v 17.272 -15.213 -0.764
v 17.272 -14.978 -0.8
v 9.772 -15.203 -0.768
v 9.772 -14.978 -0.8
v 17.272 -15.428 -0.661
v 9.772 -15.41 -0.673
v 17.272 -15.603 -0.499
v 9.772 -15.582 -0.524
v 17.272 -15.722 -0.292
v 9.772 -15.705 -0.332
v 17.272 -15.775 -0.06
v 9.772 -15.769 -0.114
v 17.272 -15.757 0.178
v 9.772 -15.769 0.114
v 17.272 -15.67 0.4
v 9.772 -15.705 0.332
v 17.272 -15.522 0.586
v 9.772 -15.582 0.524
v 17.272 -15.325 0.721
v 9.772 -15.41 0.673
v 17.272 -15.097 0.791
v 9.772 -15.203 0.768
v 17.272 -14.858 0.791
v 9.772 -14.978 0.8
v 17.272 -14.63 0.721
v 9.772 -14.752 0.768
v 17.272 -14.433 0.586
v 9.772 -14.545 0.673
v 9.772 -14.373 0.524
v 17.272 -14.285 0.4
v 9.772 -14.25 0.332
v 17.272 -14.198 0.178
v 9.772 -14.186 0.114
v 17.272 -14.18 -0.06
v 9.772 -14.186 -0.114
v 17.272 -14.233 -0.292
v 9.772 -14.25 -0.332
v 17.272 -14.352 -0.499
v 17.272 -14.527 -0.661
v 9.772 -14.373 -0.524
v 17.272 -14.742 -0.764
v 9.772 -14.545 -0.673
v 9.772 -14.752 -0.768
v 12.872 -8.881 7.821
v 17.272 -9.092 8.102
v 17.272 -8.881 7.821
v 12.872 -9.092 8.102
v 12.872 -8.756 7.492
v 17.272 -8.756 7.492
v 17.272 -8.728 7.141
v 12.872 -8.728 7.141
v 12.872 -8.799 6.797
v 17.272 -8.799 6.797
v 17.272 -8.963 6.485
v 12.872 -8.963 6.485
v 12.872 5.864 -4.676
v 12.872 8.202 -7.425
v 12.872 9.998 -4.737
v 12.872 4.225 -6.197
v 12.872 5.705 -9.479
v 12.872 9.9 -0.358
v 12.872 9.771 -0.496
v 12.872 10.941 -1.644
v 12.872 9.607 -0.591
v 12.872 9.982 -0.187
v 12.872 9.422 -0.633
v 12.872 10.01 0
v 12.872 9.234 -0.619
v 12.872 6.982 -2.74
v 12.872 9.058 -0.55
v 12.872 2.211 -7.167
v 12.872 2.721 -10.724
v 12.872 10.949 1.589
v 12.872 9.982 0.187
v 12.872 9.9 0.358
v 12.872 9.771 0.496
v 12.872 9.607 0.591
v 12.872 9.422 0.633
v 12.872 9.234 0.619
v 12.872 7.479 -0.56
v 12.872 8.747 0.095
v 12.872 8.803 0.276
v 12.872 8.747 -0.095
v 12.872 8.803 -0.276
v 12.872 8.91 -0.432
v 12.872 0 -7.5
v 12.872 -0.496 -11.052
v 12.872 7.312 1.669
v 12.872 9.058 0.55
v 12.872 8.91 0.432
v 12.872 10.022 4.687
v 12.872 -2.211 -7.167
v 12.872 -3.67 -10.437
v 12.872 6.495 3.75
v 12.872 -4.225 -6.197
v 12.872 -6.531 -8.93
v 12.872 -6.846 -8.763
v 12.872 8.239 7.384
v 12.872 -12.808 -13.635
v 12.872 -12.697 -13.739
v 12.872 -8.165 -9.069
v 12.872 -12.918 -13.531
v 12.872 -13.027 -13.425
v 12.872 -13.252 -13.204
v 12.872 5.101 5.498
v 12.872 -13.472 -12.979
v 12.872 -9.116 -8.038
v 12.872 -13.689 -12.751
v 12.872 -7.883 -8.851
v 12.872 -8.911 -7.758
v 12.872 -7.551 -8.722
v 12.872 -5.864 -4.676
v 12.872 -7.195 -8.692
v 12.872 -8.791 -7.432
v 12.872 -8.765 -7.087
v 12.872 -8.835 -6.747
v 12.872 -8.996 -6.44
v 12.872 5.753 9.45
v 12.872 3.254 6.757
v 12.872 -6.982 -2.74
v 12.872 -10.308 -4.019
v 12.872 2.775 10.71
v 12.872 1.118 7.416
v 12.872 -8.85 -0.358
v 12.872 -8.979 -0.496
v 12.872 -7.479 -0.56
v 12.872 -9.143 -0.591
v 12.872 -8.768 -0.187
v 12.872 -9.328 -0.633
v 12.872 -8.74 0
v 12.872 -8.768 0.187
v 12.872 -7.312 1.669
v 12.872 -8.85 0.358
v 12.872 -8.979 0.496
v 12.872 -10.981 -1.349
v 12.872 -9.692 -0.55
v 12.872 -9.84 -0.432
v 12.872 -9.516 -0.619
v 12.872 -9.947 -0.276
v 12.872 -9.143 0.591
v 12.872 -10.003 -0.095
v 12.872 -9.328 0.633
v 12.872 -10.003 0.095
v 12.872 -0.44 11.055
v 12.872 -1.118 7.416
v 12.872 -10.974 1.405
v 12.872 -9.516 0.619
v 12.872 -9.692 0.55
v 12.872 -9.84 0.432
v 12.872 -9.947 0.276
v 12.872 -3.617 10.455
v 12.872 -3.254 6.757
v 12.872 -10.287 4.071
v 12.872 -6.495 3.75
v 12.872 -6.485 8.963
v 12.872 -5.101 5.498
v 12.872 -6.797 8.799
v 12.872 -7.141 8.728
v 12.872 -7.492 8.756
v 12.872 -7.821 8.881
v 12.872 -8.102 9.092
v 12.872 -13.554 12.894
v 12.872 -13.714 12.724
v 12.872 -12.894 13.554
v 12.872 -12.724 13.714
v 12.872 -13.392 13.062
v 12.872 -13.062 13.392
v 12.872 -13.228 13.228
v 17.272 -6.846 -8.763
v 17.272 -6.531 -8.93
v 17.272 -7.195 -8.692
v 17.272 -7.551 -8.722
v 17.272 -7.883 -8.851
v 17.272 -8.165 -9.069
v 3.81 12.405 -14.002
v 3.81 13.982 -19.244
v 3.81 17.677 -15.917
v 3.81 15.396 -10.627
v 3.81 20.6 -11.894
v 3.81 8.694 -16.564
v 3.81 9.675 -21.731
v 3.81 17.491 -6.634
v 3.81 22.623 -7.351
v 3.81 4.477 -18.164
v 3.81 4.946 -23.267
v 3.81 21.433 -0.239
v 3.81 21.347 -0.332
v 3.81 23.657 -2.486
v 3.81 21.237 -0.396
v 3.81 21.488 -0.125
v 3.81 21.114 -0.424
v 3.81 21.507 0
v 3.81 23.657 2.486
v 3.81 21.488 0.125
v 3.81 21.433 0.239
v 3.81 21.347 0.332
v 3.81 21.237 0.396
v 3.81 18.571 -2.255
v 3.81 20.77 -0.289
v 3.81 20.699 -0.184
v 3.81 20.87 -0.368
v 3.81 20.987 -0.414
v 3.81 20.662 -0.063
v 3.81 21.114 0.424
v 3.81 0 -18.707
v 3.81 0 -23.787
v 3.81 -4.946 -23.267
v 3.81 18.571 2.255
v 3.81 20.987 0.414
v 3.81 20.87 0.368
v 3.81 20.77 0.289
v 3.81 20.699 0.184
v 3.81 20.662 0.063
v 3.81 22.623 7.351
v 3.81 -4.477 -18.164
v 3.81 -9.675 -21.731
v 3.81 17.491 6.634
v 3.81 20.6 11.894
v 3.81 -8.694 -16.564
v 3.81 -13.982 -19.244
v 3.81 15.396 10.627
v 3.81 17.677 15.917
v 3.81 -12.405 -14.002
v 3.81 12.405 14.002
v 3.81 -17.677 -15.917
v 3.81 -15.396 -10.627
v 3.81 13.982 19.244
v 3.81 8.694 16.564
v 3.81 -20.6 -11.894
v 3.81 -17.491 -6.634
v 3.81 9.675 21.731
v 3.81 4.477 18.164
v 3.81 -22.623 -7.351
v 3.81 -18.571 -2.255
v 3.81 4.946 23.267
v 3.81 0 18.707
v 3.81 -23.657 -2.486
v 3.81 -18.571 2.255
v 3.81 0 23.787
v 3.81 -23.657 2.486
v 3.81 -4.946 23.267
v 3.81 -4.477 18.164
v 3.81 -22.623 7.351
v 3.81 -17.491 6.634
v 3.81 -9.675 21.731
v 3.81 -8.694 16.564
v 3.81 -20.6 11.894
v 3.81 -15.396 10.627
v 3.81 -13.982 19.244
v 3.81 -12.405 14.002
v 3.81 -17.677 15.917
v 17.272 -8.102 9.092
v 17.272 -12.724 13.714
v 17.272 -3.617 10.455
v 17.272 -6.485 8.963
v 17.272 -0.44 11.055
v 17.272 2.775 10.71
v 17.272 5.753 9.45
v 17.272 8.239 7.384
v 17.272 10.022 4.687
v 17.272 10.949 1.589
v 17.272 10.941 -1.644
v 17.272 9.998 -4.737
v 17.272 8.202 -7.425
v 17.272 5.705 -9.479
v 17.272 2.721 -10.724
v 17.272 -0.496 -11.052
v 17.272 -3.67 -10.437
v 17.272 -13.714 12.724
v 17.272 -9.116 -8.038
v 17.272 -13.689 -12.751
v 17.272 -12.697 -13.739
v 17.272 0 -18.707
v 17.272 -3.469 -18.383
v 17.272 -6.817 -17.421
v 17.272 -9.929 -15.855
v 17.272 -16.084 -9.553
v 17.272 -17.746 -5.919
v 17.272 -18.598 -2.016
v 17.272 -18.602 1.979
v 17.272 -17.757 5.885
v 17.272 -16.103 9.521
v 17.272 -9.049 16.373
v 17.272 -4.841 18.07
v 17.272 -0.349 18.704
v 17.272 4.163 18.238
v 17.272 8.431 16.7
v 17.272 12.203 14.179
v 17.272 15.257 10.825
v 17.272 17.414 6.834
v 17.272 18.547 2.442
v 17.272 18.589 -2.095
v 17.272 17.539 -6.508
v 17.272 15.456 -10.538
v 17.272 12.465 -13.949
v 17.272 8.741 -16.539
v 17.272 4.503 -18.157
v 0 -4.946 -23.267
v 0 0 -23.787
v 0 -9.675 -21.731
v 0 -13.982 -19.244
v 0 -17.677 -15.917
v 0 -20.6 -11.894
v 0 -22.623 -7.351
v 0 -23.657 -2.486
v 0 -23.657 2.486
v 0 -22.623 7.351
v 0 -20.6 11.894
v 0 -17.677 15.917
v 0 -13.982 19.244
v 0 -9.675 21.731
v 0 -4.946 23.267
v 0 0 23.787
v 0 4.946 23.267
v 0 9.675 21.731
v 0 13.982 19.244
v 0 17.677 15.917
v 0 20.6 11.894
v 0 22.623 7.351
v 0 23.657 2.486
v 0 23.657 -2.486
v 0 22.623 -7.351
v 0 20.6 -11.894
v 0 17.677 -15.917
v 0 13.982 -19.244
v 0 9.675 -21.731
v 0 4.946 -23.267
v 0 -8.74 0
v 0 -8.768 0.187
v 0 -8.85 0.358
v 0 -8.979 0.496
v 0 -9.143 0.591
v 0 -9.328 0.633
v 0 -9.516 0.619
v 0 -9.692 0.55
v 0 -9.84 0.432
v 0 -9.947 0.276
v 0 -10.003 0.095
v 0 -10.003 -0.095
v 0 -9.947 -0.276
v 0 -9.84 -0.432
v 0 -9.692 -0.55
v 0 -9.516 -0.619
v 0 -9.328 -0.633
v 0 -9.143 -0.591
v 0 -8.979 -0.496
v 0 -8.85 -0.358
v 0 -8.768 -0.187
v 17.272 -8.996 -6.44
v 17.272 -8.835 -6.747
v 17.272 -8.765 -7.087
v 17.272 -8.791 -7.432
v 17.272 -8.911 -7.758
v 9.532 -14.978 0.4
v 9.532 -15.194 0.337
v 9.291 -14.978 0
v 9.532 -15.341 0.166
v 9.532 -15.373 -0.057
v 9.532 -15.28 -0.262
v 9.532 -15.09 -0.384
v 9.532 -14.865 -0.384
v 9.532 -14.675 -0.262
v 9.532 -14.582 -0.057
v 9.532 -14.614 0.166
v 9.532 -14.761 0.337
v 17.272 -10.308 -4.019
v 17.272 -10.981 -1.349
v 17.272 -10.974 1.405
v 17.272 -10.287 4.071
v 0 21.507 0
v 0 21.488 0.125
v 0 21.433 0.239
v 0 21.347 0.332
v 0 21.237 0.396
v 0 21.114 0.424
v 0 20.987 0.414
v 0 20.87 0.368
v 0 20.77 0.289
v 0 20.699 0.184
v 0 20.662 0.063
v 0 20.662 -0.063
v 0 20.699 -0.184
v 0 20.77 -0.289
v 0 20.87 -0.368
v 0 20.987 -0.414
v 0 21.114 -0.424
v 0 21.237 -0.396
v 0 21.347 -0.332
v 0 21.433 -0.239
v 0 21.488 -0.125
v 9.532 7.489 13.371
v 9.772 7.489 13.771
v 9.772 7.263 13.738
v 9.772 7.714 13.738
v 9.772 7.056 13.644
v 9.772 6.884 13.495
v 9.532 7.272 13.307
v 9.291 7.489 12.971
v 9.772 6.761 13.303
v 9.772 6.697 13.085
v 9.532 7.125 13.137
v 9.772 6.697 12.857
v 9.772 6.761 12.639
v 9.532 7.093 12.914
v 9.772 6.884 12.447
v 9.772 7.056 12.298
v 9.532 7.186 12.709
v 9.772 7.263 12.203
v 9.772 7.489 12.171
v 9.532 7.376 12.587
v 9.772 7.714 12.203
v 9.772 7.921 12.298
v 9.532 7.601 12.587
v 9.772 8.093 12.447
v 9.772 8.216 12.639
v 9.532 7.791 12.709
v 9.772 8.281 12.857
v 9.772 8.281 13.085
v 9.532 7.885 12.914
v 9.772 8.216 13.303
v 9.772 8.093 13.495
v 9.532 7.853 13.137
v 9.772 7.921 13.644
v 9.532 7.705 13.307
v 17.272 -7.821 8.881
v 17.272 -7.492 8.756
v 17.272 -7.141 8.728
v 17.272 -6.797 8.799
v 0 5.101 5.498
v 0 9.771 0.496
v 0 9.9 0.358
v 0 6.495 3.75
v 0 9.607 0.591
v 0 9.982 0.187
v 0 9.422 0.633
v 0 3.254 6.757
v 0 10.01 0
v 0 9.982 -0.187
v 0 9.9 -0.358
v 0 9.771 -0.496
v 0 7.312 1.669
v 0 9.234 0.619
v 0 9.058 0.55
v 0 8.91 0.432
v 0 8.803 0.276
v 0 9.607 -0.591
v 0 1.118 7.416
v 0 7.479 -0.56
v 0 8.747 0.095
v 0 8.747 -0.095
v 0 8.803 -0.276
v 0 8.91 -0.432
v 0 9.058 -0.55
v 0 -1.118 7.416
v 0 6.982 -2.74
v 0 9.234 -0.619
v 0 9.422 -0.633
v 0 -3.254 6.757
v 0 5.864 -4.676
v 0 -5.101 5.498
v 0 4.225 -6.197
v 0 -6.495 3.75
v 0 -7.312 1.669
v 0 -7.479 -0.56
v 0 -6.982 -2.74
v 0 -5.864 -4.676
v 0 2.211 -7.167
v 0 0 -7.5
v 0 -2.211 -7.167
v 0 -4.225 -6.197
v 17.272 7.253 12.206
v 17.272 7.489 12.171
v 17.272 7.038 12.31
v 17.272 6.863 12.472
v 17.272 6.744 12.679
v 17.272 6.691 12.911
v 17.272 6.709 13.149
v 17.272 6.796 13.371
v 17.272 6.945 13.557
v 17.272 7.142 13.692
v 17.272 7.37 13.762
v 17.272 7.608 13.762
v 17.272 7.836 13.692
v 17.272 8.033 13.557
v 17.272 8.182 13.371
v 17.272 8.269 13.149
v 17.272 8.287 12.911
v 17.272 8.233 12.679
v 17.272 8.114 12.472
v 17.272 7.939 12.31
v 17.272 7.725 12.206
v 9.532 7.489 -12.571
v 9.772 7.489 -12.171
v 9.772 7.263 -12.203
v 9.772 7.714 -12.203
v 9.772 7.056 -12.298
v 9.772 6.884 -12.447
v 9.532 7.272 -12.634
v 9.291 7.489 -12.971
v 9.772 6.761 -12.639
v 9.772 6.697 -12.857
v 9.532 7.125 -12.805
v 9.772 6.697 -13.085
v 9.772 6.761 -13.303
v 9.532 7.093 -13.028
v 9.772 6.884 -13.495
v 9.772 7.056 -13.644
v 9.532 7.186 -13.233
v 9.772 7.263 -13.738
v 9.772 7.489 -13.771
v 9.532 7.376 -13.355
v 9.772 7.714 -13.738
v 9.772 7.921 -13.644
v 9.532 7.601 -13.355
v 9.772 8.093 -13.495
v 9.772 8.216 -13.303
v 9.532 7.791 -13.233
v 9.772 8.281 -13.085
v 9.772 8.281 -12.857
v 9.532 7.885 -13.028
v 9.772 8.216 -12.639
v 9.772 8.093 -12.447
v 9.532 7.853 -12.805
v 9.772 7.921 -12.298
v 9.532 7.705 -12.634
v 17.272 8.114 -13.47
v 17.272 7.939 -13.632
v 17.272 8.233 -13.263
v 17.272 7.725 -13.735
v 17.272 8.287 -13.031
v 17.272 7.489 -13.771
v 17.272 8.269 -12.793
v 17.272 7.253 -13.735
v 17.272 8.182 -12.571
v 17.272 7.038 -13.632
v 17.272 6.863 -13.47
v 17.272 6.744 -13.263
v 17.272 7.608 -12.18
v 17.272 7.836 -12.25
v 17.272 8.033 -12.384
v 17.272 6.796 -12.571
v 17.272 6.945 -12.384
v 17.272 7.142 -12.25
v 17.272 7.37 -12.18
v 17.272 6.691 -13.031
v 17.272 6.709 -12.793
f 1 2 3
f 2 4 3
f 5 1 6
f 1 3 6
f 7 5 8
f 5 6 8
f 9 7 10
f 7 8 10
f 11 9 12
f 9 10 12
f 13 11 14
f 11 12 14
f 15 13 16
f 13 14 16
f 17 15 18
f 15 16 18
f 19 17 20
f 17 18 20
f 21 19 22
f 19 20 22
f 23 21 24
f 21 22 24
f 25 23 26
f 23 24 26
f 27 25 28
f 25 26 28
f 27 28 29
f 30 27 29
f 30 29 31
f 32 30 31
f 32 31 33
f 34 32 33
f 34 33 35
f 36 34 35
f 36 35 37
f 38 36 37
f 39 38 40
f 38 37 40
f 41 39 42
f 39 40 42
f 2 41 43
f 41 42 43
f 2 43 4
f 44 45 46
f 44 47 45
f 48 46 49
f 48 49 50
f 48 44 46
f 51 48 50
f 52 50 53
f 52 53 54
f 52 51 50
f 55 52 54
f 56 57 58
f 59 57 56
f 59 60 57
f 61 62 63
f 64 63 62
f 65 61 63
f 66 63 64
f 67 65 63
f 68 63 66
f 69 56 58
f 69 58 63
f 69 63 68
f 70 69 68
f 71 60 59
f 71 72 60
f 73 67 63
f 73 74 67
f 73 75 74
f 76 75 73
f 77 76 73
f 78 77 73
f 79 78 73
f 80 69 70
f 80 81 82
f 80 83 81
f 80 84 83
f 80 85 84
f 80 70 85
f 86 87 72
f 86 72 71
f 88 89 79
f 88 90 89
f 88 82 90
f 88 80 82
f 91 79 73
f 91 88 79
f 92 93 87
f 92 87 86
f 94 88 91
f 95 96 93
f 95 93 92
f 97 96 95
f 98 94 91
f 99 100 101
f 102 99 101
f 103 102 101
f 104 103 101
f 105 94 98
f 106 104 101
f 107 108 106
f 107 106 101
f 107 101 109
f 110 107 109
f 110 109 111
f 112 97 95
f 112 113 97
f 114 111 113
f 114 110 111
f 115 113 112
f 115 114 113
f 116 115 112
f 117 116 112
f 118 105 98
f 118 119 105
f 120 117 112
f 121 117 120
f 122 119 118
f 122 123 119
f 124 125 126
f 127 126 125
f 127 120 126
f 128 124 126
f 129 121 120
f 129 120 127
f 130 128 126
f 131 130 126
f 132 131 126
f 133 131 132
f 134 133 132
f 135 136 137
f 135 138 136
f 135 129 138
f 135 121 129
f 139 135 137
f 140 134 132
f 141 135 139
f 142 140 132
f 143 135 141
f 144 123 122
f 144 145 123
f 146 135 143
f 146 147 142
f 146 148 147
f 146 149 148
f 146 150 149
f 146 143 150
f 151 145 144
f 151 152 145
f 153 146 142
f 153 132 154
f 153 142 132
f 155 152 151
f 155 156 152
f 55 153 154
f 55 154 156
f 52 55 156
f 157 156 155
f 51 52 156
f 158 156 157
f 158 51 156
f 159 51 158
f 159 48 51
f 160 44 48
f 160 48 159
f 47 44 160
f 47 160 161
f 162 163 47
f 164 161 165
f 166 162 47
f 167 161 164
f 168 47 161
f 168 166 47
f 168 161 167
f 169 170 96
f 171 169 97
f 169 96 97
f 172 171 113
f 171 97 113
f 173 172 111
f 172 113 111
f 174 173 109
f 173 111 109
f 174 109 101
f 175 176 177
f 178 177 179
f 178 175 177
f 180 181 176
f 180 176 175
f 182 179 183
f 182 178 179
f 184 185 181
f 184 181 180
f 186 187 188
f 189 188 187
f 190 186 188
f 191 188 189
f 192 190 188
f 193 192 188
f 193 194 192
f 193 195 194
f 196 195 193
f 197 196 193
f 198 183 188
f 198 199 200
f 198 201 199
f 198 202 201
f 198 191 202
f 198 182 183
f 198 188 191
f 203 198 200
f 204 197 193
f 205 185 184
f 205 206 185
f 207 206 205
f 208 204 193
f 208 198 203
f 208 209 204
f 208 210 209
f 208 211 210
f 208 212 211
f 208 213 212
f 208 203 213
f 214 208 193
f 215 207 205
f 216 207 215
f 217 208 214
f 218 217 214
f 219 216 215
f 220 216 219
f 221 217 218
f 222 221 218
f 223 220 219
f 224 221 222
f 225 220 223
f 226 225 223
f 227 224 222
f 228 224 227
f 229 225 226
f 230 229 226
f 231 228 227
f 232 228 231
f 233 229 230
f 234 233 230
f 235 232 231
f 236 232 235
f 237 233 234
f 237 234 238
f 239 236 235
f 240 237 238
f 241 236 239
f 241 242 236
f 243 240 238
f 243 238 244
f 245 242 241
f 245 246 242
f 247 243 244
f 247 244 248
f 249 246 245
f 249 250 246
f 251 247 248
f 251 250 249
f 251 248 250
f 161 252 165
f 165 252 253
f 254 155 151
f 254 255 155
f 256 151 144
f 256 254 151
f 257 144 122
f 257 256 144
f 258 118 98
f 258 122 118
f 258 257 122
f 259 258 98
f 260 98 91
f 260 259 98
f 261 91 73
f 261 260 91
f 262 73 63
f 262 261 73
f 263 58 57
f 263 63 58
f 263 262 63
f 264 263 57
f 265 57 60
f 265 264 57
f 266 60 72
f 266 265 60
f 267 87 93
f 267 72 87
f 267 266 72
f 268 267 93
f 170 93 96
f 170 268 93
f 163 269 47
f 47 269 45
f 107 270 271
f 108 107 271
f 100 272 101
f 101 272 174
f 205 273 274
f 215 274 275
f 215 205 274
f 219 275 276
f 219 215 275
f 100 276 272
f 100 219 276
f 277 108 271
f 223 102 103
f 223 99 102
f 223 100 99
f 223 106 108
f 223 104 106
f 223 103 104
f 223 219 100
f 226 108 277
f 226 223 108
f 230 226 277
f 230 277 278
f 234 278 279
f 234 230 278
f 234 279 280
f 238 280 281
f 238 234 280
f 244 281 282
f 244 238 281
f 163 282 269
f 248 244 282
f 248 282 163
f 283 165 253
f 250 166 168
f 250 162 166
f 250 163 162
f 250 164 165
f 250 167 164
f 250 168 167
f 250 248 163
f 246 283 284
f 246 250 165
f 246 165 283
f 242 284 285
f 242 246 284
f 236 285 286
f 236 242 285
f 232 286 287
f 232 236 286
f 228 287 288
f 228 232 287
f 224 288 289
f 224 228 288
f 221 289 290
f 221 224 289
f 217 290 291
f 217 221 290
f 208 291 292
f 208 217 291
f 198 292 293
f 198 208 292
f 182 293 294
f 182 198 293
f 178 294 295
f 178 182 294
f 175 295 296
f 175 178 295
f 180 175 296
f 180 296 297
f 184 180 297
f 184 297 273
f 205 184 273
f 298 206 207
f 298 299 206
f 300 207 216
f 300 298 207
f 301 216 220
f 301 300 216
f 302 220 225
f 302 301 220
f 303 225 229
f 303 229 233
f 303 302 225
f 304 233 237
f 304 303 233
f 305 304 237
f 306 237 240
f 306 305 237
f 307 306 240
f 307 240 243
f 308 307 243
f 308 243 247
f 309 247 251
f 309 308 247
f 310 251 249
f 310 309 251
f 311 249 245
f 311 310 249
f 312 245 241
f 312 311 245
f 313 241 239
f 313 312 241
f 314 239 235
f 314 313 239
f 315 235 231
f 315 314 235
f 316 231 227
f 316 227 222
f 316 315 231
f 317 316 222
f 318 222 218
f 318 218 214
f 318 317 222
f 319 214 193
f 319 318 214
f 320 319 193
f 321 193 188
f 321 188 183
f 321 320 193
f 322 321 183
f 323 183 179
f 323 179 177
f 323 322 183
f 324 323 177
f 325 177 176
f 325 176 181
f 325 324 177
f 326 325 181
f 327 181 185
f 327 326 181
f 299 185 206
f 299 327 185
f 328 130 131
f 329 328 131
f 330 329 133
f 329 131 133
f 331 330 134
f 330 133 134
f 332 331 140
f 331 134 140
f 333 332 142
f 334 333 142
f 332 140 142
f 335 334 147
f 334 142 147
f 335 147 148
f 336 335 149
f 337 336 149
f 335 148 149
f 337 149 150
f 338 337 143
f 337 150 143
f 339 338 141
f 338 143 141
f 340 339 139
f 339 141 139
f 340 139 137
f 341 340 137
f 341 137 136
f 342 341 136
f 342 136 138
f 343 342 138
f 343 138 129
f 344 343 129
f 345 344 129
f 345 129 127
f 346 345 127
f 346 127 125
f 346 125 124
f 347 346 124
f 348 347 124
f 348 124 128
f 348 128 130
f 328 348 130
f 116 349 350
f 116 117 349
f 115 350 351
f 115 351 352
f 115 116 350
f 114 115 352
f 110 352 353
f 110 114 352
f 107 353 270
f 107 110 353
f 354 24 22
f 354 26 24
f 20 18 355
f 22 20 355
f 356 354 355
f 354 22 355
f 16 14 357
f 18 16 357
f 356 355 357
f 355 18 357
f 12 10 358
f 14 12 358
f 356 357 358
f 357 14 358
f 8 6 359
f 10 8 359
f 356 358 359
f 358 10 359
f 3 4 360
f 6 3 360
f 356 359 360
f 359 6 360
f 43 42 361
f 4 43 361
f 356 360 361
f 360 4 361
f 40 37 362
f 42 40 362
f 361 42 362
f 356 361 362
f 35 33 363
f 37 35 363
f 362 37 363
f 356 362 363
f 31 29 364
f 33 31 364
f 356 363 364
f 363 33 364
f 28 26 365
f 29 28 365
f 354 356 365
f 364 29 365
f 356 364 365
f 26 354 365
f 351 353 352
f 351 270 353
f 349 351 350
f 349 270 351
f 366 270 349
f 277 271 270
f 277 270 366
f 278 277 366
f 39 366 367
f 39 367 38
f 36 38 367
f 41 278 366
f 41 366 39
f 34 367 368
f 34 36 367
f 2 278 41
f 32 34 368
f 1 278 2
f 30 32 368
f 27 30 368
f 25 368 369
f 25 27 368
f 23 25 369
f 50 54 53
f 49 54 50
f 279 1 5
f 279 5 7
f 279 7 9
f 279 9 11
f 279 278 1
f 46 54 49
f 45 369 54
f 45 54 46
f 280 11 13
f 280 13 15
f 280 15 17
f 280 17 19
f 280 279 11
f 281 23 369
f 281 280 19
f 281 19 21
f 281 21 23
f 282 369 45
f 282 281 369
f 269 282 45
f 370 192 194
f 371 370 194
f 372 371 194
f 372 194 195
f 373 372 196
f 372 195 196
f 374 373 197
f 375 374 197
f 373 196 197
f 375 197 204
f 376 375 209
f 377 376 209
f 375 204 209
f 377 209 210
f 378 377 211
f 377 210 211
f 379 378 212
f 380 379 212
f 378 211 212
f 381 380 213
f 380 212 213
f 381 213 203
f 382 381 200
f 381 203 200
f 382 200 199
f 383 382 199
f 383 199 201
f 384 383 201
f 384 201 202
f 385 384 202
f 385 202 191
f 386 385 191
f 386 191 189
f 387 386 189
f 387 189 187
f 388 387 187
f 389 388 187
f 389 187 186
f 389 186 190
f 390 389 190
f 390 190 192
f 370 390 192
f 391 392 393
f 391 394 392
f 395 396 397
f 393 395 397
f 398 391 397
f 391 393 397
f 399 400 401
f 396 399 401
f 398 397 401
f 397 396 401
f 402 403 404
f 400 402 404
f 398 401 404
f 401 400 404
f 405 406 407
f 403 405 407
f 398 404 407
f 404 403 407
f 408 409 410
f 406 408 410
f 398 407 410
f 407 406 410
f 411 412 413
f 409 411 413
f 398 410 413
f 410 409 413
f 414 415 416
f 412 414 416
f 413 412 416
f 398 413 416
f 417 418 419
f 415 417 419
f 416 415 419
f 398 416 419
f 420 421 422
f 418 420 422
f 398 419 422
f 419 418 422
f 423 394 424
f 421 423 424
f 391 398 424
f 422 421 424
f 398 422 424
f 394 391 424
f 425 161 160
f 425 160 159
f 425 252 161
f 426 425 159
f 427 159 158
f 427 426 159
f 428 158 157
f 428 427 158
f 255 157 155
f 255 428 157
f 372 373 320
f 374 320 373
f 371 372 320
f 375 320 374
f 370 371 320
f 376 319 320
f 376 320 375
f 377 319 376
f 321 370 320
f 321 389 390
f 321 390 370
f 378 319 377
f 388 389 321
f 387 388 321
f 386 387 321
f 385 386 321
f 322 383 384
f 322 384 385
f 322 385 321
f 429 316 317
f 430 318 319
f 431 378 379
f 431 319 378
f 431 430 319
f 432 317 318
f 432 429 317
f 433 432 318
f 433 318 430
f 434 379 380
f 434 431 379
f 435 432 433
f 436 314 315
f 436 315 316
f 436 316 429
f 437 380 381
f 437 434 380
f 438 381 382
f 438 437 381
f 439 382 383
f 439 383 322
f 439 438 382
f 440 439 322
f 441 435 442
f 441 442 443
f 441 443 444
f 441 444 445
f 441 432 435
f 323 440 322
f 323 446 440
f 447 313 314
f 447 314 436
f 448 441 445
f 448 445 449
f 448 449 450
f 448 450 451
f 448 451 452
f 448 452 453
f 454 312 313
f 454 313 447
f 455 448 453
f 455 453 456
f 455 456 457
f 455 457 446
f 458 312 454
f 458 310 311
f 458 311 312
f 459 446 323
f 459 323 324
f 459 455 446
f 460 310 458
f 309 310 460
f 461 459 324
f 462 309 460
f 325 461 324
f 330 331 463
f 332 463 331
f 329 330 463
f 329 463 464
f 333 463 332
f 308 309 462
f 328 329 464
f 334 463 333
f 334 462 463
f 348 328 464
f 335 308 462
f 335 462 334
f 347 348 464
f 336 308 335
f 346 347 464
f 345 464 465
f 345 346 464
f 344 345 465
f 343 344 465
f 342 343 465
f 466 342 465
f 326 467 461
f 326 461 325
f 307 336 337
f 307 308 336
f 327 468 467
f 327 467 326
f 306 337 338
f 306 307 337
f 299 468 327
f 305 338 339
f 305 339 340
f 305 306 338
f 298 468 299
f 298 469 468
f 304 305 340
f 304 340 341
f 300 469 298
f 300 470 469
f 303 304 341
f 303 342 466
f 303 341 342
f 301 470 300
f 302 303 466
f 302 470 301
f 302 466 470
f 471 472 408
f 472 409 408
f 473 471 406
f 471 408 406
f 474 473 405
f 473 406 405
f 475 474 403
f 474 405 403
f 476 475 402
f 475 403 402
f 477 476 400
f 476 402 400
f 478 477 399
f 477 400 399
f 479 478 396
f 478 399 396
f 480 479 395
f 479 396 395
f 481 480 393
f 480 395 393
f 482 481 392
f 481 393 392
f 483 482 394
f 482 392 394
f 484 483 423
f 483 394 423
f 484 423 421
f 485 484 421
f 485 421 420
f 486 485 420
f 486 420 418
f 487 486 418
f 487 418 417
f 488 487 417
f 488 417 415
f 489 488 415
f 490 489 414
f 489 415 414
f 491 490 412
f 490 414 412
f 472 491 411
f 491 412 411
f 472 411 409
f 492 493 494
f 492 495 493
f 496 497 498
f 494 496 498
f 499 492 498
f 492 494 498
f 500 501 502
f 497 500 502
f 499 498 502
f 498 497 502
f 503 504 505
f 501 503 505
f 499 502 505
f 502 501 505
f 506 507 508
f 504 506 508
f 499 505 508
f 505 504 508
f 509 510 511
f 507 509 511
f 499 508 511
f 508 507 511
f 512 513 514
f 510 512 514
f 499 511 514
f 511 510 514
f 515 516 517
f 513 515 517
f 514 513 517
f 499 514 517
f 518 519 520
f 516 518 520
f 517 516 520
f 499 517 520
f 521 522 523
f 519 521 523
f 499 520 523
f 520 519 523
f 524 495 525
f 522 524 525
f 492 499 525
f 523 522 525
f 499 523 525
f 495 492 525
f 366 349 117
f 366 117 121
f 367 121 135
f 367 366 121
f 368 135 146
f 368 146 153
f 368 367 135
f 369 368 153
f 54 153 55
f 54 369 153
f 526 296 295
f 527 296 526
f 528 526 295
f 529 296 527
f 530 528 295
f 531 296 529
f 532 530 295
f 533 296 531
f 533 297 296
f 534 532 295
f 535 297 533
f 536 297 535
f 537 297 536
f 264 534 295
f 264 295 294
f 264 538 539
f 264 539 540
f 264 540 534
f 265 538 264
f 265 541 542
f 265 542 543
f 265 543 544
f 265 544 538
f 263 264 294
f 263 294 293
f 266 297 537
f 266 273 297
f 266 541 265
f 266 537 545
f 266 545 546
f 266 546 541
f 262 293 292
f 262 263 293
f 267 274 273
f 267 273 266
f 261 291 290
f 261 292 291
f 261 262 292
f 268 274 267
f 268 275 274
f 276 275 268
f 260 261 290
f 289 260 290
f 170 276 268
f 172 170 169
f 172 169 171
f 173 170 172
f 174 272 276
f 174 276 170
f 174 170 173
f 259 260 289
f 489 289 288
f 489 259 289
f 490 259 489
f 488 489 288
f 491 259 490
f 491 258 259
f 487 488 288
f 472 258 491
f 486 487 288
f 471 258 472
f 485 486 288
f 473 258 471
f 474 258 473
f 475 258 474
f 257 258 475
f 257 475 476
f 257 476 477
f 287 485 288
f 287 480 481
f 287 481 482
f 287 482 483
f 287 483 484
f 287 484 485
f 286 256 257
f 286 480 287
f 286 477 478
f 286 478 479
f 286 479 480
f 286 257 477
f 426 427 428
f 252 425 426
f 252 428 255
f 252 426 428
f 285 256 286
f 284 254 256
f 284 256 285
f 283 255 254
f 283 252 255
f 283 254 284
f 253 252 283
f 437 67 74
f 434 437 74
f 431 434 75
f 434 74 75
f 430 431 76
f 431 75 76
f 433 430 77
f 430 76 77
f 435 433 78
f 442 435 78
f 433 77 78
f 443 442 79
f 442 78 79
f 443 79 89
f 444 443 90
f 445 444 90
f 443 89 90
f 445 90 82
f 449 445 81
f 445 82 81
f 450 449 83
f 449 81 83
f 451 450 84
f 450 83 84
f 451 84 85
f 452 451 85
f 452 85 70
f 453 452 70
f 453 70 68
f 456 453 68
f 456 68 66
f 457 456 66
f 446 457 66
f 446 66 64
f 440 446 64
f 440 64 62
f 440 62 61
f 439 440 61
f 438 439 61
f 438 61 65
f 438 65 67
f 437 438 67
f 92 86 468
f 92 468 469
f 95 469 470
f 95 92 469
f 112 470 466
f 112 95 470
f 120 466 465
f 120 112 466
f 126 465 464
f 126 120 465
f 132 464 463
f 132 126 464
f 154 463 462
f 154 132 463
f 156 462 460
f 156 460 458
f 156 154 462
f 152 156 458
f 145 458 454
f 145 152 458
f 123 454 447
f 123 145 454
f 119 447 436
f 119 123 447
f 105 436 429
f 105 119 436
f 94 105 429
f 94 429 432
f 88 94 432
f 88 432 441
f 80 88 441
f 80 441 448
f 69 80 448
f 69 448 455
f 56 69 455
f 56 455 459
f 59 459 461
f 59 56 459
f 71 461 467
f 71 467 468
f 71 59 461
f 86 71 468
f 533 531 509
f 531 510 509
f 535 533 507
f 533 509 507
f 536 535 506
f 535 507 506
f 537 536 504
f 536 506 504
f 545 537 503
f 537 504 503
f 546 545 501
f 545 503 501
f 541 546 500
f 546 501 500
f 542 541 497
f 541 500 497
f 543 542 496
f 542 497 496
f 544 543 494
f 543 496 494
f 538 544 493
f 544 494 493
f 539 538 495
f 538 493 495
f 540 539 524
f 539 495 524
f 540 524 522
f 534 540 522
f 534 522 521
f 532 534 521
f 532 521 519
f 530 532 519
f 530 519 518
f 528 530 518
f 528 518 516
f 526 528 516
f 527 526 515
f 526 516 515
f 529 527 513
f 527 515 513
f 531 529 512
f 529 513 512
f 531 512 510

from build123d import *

# Parameters (mm, degrees)
SKETCH2_R                 = 0.315
CUT_EXTRUDE1_DEPTH        = 4.4
SKETCH3_R                 = 0.425
CUT_EXTRUDE2_DEPTH        = 37.233654202
SKETCH4_R                 = 0.635
CUT_EXTRUDE3_DEPTH        = 37.018615143
FILLET1_R                 = 1.25
M2X0_4_TAPPED_HOLE1_D     = 1.6
M2X0_4_TAPPED_HOLE1_DEPTH = 7.5
M2X0_4_TAPPED_HOLE1_TIP   = 0.480688495


with BuildPart() as part:
    # Sketch1 → Revolve1 (revolve)
    with BuildSketch(Plane.XY, mode=Mode.PRIVATE) as revolve1_sk:
        Polygon((0, 23.7871), (0, 7.5), (12.872, 7.5), (12.872, 11.0635), (17.272, 11.0635), (17.272, 18.7071), (3.81, 18.7071), (3.81, 23.7871), align=None)
    revolve(revolve1_sk.sketch.rotate(Axis((12.872, 0, 0), (-1, 0, 0)), 90), axis=Axis((12.872, 0, 0), (-1, 0, 0)))

    # Sketch2 → Cut-Extrude1 (cut)
    with BuildSketch(Plane(origin=(17.272, 0, 0), x_dir=(0, 0, -1), z_dir=(1, 0, 0))):
        with BuildLine():
            Line((-0.657808531, -0.677910665), (0, 0))
            Line((0, 0), (-0.494974747, 0.494974747))
            Line((-0.494974747, 0.494974747), (-8.302376115, -7.312426621))
            ThreePointArc((-8.302376115, -7.312426621), (-7.823075874, -7.823075874), (-7.312426621, -8.302376115))
            Line((-7.312426621, -8.302376115), (-0.16558691, -1.155536403))
            Line((-0.16558691, -1.155536403), (-0.657808531, -0.677910665))
        make_face()
        with BuildLine():
            Line((-12.723678558, -13.713628052), (-7.312426621, -8.302376115))
            ThreePointArc((-7.312426621, -8.302376115), (-7.823075874, -7.823075874), (-8.302376115, -7.312426621))
            Line((-8.302376115, -7.312426621), (-13.713628052, -12.723678558))
            ThreePointArc((-13.713628052, -12.723678558), (-13.473131789, -12.978070358), (-13.227917265, -13.227917267))
            ThreePointArc((-13.227917265, -13.227917267), (-12.978070357, -13.473131789), (-12.723678558, -13.713628052))
        make_face()
        with BuildLine():
            Line((13.738626304, -12.696682153), (8.250314399, -7.371115558))
            ThreePointArc((8.250314399, -7.371115558), (7.767282545, -7.878474098), (7.253109959, -8.354246116))
            Line((7.253109959, -8.354246116), (12.750537979, -13.688658505))
            ThreePointArc((12.750537979, -13.688658505), (13.09218126, -13.362274517), (13.425472665, -13.027366354))
            ThreePointArc((13.425472665, -13.027366354), (13.58305585, -12.862977268), (13.738626304, -12.696682153))
        make_face()
        with BuildLine():
            Line((8.250314399, -7.371115558), (0.317132147, 0.326823466))
            Line((0.317132147, 0.326823466), (0, 0))
            Line((0, 0), (0.494974747, -0.494974747))
            Line((0.494974747, -0.494974747), (-0.16558691, -1.155536403))
            Line((-0.16558691, -1.155536403), (7.253109959, -8.354246116))
            ThreePointArc((7.253109959, -8.354246116), (7.767282545, -7.878474098), (8.250314399, -7.371115558))
        make_face()
        with Locations((0, -14.9775)):
            Circle(SKETCH2_R)
        with Locations((-12.970895485, 7.48875)):
            Circle(SKETCH2_R)
        with Locations((12.970895485, 7.48875)):
            Circle(SKETCH2_R)
    extrude(amount=-CUT_EXTRUDE1_DEPTH, mode=Mode.SUBTRACT)

    # Sketch3 → Cut-Extrude2 (cut, through all)
    with BuildSketch(Plane(origin=(3.81, 0, 0), x_dir=(0, 0, -1), z_dir=(1, 0, 0))):
        with Locations(Location((0, 21.082, 0), (0, 0, 90))):
            Circle(SKETCH3_R)
    extrude(amount=-CUT_EXTRUDE2_DEPTH, mode=Mode.SUBTRACT)

    # Sketch4 → Cut-Extrude3 (cut, through all)
    with BuildSketch(Plane(origin=(12.872, 0, 0), x_dir=(0, 0, -1), z_dir=(1, 0, 0))):
        with Locations(Location((0, 9.375, 0), (0, 0, 90))):
            Circle(SKETCH4_R)
        with Locations(Location((0, -9.375, 0), (0, 0, 90))):
            Circle(SKETCH4_R)
    extrude(amount=-CUT_EXTRUDE3_DEPTH, mode=Mode.SUBTRACT)

    # Fillet1
    fillet1_edges = [part.edges().sort_by_distance(p)[0] for p in [
        (15.072, -7.312426621, 8.302376115),
        (15.072, -8.302376115, 7.312426621),
        (15.072, -7.371115558, -8.250314399),
        (15.072, -8.354246116, -7.253109959),
    ]]
    fillet(fillet1_edges, radius=FILLET1_R)

    # M2x0.4 Tapped Hole1
    with Locations(Plane(origin=(17.272, 7.48875, 12.970895485), x_dir=(0, 0, 1), z_dir=(1, 0, 0))):
        with Locations((0, 0), (-25.94179097, 0), (-12.970895485, 22.46625)):
            Hole(M2X0_4_TAPPED_HOLE1_D / 2, depth=M2X0_4_TAPPED_HOLE1_DEPTH)
            with Locations((0, 0, -(M2X0_4_TAPPED_HOLE1_DEPTH + M2X0_4_TAPPED_HOLE1_TIP / 2))):  # 118° drill point
                Cone(0, M2X0_4_TAPPED_HOLE1_D / 2, M2X0_4_TAPPED_HOLE1_TIP, mode=Mode.SUBTRACT)


solid = part.part
